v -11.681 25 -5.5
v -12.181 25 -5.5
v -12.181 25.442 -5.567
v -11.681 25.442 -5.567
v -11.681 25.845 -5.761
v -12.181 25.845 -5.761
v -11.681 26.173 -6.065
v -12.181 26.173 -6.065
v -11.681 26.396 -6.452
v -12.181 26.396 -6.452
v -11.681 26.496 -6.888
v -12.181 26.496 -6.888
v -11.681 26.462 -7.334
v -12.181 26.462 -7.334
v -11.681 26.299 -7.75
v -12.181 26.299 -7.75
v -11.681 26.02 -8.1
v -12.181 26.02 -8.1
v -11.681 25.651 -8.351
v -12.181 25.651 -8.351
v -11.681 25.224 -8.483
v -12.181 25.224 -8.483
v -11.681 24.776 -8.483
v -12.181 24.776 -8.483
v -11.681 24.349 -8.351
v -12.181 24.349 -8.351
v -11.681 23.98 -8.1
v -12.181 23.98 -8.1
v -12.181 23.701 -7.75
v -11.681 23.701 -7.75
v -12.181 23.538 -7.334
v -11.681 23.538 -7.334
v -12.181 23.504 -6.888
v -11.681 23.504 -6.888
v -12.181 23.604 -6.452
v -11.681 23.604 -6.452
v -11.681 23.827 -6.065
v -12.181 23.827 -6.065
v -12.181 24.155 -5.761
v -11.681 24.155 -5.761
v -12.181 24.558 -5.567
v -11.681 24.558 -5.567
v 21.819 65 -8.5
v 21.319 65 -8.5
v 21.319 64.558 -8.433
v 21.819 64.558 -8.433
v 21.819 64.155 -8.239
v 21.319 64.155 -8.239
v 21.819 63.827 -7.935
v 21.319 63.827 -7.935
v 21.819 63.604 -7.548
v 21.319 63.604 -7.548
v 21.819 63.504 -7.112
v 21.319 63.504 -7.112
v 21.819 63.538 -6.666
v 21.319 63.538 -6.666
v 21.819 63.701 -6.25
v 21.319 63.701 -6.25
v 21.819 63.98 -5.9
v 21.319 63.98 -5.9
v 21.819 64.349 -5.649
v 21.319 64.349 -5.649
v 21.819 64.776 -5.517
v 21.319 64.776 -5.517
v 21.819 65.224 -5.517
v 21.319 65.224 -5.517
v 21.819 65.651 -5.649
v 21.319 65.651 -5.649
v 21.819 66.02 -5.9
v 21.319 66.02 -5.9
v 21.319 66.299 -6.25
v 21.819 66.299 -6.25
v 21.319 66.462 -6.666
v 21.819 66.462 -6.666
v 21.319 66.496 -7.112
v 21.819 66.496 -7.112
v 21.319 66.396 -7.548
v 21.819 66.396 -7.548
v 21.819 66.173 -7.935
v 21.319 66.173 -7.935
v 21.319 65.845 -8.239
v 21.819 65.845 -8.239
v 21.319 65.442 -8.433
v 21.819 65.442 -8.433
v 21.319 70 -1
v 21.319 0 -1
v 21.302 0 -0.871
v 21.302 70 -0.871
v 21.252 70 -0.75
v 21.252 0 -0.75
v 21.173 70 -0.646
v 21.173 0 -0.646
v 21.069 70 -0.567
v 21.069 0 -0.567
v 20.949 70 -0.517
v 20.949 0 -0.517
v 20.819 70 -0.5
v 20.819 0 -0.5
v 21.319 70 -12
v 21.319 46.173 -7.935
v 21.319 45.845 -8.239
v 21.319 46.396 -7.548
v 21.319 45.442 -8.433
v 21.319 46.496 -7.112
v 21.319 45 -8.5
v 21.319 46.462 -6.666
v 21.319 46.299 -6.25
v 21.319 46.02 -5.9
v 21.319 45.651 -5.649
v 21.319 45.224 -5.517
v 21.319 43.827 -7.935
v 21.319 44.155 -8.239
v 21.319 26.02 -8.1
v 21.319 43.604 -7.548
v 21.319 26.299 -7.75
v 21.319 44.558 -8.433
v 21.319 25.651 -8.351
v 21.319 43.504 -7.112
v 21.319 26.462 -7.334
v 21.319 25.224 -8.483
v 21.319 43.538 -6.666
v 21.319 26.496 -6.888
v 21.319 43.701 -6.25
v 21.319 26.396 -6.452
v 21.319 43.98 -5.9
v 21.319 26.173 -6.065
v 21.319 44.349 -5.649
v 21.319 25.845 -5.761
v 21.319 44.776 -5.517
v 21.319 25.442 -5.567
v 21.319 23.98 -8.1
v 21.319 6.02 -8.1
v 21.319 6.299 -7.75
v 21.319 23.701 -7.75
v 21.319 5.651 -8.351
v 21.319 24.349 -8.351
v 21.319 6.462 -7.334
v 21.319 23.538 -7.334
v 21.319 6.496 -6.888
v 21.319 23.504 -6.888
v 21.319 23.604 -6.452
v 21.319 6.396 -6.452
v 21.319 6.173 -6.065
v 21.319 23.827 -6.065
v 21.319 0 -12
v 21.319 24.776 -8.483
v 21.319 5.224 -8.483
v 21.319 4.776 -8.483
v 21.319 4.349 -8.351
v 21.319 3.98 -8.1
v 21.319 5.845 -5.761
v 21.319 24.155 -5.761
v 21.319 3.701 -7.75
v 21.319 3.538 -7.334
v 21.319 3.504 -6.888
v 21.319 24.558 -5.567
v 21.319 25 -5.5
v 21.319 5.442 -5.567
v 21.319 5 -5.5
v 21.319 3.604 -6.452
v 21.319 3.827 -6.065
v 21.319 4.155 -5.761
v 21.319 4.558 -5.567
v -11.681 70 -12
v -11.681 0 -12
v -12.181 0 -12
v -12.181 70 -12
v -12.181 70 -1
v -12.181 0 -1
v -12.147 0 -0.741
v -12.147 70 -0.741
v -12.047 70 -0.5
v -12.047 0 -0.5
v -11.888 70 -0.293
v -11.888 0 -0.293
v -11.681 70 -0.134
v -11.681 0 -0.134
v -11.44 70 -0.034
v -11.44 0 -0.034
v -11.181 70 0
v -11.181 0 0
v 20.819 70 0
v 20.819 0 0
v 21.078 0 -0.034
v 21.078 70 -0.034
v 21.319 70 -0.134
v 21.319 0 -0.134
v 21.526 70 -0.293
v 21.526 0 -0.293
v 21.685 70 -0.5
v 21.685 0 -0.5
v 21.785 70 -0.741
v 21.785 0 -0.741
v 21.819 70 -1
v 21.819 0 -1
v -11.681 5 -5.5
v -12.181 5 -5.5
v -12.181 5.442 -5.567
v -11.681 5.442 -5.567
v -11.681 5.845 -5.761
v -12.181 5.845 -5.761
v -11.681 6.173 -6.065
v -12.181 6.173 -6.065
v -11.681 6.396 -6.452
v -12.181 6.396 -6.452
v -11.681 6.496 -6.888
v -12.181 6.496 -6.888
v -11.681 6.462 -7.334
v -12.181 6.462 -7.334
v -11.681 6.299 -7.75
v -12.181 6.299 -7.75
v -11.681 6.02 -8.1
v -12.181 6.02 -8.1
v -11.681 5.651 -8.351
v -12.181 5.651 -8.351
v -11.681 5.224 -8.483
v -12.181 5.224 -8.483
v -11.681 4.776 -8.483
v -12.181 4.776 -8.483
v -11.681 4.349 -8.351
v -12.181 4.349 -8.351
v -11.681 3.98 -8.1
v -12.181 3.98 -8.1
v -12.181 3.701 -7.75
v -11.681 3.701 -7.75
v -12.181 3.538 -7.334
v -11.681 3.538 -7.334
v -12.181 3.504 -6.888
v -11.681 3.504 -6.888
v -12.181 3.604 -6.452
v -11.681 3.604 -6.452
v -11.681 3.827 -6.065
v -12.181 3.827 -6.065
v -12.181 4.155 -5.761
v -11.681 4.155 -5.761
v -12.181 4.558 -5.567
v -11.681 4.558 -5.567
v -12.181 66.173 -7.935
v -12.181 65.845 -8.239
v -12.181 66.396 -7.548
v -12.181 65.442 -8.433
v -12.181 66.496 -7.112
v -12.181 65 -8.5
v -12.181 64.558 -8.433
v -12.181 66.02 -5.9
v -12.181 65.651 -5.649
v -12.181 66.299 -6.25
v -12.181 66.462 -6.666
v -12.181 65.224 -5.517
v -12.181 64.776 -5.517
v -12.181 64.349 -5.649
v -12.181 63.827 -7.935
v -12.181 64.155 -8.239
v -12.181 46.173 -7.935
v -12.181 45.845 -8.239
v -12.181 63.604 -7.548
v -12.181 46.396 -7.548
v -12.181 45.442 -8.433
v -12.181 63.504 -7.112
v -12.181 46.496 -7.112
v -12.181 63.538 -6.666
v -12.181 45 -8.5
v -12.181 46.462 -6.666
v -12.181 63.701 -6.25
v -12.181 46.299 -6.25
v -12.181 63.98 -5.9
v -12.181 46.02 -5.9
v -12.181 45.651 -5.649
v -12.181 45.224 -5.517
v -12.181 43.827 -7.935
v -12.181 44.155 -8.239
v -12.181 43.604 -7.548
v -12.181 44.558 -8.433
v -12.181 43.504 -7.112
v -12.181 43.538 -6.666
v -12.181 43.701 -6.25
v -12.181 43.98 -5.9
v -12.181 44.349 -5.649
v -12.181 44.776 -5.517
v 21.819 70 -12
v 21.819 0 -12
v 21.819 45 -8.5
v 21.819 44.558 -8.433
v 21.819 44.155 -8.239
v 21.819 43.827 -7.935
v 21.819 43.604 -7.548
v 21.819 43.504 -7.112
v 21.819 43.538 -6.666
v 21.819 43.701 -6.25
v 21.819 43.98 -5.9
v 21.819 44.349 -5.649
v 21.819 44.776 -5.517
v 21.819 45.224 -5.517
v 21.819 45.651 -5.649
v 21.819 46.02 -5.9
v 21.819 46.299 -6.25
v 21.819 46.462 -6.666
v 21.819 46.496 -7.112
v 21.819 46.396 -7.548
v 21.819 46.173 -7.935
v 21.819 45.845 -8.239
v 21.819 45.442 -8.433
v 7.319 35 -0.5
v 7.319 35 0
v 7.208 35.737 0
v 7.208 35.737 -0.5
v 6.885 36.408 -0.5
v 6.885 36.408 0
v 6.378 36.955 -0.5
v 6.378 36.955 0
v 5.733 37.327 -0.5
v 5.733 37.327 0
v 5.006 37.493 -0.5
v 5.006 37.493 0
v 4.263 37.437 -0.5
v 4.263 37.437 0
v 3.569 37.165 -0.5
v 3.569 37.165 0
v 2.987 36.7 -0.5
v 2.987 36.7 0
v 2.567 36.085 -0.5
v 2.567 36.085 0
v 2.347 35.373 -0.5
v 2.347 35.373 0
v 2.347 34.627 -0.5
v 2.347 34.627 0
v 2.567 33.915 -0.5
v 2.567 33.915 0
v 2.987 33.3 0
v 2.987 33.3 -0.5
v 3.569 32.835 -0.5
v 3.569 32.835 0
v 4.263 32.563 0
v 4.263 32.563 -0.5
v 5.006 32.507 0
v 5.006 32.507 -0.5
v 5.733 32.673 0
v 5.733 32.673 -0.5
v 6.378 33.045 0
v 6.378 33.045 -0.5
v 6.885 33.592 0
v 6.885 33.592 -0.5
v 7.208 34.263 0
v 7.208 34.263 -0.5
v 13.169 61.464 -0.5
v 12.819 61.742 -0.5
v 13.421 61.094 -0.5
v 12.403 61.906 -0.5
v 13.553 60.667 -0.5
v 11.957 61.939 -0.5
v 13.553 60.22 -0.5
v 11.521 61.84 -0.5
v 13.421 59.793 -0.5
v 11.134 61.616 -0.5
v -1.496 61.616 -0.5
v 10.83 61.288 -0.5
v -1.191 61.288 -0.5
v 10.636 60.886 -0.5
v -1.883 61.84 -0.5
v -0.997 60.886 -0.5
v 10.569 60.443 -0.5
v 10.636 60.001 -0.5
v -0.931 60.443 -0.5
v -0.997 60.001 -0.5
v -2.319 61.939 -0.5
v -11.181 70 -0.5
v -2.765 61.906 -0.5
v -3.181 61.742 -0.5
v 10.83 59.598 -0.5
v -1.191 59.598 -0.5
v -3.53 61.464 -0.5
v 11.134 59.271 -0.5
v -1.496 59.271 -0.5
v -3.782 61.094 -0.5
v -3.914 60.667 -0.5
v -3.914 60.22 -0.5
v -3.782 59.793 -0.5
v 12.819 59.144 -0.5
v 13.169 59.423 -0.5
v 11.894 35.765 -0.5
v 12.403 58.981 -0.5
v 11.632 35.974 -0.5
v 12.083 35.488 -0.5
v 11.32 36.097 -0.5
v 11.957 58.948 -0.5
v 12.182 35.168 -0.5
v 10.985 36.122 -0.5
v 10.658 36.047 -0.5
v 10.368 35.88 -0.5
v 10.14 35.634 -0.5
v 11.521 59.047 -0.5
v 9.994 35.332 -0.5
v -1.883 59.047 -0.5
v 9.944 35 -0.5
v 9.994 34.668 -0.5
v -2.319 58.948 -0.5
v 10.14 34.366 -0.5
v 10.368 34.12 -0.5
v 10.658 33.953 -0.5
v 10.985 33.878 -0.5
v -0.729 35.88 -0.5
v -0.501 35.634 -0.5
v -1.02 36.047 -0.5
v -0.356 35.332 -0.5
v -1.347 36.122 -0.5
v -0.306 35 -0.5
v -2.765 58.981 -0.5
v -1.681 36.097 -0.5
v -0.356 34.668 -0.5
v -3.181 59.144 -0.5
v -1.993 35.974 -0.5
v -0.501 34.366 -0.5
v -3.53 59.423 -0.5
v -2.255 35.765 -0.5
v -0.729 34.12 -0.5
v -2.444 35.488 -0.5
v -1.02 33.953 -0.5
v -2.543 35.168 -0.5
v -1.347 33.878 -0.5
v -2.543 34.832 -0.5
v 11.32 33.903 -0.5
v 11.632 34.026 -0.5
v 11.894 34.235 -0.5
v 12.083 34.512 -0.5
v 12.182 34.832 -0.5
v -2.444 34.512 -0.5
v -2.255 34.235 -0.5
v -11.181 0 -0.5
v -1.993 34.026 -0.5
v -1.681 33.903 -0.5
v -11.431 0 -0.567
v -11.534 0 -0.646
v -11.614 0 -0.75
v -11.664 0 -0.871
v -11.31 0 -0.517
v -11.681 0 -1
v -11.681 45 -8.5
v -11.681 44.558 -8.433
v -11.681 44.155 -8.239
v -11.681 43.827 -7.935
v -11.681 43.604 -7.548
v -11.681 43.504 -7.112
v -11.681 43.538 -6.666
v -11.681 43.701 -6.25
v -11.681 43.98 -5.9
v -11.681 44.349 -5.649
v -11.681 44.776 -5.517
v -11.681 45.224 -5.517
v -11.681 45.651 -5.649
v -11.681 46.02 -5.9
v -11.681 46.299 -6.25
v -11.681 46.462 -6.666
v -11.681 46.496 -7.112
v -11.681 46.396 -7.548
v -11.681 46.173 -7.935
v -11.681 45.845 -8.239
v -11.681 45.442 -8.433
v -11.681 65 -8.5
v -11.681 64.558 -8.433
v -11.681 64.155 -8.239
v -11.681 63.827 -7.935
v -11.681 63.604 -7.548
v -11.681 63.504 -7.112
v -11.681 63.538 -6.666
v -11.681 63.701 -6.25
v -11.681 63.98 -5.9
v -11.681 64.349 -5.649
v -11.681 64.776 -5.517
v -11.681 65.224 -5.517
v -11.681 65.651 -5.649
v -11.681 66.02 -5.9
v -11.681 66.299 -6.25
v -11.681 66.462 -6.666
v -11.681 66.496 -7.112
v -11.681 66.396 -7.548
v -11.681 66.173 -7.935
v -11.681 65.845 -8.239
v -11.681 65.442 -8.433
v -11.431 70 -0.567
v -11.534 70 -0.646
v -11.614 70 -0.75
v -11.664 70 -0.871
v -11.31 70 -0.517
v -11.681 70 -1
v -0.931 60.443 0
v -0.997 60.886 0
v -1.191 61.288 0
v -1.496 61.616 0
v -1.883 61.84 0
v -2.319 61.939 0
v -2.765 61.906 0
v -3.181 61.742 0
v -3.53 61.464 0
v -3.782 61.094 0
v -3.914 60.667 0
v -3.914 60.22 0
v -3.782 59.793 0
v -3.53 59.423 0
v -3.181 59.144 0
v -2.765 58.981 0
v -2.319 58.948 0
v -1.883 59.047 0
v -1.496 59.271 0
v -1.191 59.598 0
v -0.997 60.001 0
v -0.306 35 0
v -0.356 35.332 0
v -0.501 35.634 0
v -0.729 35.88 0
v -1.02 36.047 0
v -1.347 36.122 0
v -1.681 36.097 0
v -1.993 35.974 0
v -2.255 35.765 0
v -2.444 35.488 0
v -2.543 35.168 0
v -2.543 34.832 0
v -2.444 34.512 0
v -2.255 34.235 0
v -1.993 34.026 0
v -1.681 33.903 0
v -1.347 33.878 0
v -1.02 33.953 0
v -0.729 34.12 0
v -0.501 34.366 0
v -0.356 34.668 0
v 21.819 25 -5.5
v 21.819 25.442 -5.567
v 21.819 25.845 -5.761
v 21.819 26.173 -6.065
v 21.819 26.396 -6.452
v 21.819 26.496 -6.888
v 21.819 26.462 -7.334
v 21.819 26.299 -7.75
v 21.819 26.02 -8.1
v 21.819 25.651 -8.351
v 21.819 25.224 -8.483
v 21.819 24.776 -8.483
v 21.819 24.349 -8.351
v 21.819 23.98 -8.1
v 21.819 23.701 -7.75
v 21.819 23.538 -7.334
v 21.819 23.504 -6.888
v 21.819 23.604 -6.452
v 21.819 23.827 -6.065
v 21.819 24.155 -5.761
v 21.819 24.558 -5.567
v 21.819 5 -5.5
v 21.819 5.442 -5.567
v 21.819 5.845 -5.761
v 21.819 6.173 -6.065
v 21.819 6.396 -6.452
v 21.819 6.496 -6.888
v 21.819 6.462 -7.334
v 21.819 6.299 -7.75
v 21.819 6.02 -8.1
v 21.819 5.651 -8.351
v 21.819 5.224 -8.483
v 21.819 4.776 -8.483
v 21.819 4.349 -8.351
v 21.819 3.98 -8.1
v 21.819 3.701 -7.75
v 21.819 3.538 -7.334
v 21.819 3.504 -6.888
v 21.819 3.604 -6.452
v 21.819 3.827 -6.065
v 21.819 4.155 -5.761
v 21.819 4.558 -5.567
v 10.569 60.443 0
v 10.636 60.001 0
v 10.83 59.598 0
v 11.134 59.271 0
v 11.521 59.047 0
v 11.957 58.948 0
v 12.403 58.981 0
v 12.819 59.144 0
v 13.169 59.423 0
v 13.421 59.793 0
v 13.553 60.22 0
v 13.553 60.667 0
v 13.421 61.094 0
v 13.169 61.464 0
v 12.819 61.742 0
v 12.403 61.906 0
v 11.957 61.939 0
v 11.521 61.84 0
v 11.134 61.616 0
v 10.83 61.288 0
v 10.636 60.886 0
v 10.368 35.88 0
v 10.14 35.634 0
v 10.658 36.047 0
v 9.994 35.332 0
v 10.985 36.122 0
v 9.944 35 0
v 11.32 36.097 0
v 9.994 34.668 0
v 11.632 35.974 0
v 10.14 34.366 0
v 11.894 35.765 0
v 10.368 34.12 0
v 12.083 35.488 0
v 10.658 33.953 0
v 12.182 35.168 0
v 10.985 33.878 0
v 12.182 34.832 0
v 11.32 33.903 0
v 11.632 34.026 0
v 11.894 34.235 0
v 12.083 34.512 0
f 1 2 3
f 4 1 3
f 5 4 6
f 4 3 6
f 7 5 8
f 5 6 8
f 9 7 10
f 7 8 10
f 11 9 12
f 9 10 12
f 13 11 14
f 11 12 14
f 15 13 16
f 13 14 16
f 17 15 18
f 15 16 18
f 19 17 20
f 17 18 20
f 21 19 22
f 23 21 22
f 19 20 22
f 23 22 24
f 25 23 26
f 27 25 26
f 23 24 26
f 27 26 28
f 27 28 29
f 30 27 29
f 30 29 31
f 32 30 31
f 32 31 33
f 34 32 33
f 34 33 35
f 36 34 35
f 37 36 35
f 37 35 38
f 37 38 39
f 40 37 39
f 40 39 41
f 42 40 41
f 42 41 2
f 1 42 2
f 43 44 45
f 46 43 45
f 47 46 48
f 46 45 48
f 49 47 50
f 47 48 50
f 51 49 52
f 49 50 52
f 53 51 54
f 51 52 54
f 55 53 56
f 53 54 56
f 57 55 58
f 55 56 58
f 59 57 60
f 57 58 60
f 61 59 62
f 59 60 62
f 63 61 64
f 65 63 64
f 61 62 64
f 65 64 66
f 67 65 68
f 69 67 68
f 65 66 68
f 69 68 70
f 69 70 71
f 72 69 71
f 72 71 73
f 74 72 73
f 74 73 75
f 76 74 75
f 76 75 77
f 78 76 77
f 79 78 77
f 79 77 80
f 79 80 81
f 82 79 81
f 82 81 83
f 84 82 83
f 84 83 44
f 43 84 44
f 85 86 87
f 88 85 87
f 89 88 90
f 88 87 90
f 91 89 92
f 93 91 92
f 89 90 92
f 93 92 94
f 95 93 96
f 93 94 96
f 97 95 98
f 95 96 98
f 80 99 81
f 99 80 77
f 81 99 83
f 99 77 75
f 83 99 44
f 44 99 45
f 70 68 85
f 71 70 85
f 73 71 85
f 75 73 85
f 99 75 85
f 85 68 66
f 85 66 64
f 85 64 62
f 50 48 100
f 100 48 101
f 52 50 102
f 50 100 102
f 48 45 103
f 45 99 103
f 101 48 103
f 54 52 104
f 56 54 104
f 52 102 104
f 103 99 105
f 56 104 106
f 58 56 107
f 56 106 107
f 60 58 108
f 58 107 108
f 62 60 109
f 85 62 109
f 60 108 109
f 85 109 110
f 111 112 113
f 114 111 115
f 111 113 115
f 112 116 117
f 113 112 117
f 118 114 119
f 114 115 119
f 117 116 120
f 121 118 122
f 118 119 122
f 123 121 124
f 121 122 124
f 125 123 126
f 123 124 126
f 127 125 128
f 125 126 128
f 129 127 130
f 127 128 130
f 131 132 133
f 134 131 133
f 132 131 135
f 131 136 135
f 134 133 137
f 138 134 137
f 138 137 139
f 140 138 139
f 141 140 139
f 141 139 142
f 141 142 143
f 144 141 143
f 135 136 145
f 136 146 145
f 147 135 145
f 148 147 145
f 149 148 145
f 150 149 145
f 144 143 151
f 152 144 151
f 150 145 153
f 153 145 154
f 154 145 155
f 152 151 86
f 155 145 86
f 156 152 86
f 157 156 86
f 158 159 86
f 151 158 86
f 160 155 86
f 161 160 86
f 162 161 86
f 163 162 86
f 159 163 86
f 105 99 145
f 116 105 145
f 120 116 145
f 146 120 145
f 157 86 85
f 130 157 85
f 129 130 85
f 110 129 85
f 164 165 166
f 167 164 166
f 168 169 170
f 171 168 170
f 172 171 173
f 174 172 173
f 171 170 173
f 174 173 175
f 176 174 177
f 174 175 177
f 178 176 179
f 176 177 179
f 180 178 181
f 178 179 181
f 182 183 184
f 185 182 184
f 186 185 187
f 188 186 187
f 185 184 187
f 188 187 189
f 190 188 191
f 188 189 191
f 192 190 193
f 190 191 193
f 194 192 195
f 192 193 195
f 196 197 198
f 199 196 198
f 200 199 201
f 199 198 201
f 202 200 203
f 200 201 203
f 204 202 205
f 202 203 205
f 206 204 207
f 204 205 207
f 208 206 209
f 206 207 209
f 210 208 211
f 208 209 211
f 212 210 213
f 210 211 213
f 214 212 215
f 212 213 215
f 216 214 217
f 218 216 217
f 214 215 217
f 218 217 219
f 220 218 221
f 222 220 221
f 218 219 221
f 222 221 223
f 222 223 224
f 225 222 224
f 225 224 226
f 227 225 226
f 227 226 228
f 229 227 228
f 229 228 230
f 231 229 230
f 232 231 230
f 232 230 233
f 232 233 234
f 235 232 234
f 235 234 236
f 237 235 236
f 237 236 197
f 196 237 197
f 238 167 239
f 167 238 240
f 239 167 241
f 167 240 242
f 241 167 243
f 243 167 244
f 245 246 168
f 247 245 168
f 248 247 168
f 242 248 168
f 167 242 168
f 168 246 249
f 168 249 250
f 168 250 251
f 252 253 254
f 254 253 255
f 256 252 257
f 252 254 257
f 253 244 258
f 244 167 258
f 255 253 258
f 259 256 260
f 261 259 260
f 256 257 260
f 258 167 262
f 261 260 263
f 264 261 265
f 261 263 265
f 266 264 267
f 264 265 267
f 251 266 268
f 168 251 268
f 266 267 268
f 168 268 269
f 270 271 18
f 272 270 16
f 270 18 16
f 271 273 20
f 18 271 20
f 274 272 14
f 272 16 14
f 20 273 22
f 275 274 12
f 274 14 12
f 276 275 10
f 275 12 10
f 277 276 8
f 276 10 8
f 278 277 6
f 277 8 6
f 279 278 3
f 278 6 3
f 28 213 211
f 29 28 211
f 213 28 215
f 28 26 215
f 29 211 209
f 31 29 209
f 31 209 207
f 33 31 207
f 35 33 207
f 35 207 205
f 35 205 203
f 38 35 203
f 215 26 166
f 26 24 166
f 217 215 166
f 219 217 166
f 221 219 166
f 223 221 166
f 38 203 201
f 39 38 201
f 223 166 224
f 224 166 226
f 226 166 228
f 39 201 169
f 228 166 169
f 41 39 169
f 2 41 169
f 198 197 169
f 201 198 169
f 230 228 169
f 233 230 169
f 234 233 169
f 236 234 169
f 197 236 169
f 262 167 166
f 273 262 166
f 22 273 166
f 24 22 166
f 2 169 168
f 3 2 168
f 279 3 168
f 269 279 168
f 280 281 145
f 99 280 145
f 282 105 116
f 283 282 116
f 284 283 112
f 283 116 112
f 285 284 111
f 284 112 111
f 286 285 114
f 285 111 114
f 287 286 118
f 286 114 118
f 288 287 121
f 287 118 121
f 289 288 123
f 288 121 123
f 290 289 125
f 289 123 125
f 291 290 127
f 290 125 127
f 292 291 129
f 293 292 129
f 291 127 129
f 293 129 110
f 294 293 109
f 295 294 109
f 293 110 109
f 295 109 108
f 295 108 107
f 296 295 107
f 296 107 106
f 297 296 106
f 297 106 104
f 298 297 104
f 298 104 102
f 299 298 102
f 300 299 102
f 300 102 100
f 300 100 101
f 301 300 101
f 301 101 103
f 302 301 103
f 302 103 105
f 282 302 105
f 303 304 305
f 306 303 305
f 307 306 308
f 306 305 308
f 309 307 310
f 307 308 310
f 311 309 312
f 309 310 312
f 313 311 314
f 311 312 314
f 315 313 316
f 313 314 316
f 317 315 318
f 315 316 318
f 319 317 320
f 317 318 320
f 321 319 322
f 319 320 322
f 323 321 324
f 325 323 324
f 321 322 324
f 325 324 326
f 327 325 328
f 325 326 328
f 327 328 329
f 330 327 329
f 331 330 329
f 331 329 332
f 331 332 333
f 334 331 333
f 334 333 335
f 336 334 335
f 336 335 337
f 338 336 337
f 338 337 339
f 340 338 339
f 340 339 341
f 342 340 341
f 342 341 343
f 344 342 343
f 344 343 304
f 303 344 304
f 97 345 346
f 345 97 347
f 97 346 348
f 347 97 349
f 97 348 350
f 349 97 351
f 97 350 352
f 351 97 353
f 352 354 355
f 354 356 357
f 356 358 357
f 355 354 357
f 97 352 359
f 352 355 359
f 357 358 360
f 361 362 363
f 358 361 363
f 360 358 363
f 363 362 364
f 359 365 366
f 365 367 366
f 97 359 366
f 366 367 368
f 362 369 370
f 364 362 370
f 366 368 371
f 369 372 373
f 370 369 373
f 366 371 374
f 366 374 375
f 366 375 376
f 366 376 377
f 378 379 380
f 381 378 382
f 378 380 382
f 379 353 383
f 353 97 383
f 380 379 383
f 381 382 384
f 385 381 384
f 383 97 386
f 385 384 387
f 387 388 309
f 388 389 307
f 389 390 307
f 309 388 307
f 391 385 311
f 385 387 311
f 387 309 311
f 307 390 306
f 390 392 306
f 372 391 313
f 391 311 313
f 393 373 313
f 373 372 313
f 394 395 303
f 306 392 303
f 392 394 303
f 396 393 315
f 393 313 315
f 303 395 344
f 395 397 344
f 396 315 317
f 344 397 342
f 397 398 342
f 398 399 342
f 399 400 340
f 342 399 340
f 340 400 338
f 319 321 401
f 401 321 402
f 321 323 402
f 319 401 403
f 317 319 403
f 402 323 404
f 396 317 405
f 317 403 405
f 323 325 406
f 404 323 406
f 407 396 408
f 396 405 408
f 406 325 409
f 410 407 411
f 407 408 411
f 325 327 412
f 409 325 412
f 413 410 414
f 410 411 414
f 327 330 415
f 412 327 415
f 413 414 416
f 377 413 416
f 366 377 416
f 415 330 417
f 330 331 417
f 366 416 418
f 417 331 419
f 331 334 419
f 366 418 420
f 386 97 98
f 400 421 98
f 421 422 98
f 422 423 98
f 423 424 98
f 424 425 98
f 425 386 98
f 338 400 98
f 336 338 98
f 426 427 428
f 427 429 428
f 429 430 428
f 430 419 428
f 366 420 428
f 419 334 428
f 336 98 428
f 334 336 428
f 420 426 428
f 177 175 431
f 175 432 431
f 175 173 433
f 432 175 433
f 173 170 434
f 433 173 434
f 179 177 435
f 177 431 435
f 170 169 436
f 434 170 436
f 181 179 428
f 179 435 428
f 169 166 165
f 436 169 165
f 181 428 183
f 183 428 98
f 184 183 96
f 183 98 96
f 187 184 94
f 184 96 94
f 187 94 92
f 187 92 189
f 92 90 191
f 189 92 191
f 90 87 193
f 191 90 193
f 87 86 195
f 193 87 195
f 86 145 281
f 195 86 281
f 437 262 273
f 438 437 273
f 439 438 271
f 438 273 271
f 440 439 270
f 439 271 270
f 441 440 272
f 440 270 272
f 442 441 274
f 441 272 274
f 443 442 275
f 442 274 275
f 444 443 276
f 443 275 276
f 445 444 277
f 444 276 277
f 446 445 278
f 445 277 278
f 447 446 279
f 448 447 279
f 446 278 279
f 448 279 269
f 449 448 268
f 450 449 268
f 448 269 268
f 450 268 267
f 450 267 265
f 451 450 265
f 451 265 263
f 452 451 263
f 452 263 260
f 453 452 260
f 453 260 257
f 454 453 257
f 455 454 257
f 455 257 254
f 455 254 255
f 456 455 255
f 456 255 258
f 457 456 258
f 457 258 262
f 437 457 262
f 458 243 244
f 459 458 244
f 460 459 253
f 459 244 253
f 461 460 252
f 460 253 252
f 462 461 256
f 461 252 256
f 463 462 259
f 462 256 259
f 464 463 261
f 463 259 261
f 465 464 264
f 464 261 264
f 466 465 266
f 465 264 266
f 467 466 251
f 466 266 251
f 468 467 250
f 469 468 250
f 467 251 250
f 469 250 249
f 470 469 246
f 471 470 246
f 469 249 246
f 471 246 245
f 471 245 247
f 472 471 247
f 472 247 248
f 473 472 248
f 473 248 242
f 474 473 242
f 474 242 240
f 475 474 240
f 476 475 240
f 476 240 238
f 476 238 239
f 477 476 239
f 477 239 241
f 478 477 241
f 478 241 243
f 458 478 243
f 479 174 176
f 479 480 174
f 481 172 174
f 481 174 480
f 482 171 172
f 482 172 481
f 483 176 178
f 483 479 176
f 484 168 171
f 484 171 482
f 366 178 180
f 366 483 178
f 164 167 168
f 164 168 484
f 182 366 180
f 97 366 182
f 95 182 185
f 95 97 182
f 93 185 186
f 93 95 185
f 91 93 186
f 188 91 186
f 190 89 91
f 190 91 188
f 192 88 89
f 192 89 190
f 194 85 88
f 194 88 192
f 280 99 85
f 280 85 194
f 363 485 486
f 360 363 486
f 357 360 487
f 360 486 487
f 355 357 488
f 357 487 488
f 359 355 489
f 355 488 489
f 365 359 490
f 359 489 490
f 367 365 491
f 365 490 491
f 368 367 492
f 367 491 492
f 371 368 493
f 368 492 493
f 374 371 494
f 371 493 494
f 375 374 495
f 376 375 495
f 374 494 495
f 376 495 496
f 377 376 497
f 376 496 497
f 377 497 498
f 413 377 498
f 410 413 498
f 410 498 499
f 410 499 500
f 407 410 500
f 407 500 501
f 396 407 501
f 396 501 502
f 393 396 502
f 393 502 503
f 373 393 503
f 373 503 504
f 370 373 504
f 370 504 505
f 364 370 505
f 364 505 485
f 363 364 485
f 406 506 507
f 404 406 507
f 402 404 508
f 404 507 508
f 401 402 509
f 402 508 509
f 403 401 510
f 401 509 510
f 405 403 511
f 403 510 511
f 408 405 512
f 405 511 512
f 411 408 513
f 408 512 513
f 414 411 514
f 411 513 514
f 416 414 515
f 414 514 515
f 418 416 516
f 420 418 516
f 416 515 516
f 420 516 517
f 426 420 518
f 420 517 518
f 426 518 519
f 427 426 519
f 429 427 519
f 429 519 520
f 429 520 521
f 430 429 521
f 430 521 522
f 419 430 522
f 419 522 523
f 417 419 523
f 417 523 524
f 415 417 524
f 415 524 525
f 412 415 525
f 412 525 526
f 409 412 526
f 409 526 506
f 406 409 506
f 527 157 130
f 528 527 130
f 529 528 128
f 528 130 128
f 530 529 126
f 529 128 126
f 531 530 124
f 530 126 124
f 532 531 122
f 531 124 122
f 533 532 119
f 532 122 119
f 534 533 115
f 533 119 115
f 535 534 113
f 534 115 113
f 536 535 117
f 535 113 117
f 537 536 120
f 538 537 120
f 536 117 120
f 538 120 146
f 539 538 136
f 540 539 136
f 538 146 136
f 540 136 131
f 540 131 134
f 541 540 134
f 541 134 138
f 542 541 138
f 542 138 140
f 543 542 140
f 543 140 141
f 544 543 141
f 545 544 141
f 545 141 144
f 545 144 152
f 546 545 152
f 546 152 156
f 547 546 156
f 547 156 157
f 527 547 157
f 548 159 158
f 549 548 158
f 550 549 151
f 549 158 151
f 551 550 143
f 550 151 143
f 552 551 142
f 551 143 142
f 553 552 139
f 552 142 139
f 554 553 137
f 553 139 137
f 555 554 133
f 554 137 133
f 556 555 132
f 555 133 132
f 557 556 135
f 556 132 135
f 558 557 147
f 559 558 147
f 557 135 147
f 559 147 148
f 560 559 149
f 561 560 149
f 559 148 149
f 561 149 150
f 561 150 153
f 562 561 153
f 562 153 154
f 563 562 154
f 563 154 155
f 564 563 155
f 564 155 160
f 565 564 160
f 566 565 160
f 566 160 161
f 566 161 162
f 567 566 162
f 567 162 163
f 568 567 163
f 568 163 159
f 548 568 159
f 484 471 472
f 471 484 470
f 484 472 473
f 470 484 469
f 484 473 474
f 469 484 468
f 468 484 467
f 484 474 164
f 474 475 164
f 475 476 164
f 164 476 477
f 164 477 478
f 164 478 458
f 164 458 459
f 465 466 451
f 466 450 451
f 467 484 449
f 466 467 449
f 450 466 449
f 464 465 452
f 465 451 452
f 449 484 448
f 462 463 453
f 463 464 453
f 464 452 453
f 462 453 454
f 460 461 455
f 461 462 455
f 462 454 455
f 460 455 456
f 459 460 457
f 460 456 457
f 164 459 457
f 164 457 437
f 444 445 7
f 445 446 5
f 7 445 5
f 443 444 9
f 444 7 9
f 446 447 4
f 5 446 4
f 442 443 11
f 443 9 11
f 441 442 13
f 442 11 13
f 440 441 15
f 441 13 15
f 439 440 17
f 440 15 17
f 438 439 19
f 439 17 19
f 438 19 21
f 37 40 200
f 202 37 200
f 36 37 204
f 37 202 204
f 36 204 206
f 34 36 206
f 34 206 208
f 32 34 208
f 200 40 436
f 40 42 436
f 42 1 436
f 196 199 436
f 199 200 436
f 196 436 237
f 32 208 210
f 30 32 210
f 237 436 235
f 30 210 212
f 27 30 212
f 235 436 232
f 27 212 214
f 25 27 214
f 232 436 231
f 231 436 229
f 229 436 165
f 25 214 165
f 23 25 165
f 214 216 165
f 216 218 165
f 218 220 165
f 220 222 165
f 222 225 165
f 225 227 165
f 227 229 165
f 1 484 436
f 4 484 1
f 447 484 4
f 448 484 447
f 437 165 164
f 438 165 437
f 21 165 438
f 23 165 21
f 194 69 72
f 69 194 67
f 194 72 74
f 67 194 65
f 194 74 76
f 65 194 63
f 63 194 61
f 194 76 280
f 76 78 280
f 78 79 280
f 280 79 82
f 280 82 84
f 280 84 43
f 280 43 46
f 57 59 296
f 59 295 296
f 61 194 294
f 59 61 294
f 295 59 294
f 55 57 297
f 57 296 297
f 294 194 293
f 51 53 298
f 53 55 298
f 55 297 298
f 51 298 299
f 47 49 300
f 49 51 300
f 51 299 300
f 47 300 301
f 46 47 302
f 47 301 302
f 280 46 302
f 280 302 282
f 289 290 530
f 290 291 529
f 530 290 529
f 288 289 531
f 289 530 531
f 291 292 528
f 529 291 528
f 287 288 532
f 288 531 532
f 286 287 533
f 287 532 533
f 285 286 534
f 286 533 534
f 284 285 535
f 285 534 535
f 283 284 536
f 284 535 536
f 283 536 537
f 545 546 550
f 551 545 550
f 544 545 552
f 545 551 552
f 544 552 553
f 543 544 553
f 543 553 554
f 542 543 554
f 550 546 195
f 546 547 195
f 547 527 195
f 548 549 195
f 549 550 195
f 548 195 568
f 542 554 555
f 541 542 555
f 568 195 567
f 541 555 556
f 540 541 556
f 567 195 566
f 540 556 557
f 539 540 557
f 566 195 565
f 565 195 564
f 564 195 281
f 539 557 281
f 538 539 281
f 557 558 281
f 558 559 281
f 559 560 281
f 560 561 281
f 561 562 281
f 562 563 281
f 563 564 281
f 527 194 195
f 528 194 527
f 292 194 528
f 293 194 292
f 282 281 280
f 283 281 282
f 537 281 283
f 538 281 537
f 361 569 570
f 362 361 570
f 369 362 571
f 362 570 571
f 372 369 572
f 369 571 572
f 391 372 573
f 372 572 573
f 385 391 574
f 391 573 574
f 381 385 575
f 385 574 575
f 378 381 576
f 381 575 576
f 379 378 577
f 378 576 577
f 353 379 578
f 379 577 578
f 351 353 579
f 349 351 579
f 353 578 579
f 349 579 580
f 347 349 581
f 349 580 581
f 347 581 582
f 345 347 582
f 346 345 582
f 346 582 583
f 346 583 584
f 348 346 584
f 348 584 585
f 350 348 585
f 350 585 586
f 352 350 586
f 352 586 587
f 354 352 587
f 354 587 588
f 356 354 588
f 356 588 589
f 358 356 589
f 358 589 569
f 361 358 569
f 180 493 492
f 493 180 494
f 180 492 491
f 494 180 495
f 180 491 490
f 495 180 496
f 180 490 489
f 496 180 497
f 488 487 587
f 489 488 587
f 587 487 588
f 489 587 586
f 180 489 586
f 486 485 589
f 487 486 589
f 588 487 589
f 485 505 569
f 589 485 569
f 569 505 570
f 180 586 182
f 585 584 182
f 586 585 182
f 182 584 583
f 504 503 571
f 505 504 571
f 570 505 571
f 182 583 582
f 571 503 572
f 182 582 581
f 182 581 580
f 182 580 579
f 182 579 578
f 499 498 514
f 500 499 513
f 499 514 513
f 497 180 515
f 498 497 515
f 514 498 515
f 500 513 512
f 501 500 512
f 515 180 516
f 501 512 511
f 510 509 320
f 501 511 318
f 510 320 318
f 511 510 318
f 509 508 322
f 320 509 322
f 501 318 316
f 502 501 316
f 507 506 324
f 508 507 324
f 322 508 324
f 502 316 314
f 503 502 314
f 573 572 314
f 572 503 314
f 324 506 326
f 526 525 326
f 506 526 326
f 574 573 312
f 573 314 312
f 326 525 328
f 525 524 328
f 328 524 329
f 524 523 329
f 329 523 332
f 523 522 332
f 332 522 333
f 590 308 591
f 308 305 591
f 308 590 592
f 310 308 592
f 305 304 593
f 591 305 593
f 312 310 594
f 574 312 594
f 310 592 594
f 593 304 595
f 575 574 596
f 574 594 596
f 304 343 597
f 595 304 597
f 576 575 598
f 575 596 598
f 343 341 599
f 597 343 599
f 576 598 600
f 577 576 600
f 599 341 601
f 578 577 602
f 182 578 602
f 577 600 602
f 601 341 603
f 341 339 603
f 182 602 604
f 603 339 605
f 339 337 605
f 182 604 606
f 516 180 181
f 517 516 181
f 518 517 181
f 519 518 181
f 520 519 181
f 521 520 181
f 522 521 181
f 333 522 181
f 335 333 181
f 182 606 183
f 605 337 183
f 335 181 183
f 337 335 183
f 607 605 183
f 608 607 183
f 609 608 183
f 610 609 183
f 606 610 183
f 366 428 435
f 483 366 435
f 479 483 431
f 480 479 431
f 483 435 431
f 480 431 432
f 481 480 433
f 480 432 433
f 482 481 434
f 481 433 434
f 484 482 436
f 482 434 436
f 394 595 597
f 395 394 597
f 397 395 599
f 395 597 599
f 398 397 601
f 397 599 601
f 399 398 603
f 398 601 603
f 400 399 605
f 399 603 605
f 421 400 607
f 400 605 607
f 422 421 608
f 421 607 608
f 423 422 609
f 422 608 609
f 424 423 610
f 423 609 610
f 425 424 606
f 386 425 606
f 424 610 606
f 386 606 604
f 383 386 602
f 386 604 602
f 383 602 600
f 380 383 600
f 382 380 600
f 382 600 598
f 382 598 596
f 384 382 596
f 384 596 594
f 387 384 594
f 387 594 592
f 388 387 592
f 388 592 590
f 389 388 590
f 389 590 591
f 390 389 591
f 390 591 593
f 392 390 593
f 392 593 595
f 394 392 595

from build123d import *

# Parameters (mm, degrees)
BRIDA_BASE1_DEPTH     = 70
CROQUIS5_R            = 2.5
CROQUIS5_R_2          = 1.125
CROQUIS5_R_3          = 1.5
CORTAR_EXTRUIR1_DEPTH = 10
CROQUIS6_R            = 1.5
CORTAR_EXTRUIR3_DEPTH = 79.74007874


# Sheet-metal steps are written as plain solids
with BuildPart() as part:
    # Croquis1 → Brida base1 (new body)
    with BuildSketch(Plane(origin=(0, 0, 0), x_dir=(1, 0, 0), z_dir=(0, 1, 0))):
        with BuildLine():
            Line((-12.180744501, 12), (-12.180744501, 1))
            ThreePointArc((-12.180744501, 1), (-11.887851282, 0.292893219), (-11.180744501, 0))
            Line((-11.180744501, 0), (20.819255499, 0))
            ThreePointArc((20.819255499, 0), (21.52636228, 0.292893219), (21.819255499, 1))
            Line((21.819255499, 1), (21.819255499, 12))
            Line((21.819255499, 12), (21.319255499, 12))
            Line((21.319255499, 12), (21.319255499, 1))
            ThreePointArc((21.319255499, 1), (21.17280889, 0.646446609), (20.819255499, 0.5))
            Line((20.819255499, 0.5), (-11.180744501, 0.5))
            ThreePointArc((-11.180744501, 0.5), (-11.534297891, 0.646446609), (-11.680744501, 1))
            Line((-11.680744501, 1), (-11.680744501, 12))
            Line((-11.680744501, 12), (-12.180744501, 12))
        make_face()
    extrude(amount=BRIDA_BASE1_DEPTH)

    # Croquis5 → Cortar-Extruir1 (cut)
    with BuildSketch(Plane.XY):
        with Locations((4.819255499, 35)):
            Circle(CROQUIS5_R)
        with Locations((-1.430744501, 35)):
            Circle(CROQUIS5_R_2)
        with Locations(Location((11.069255499, 35, 0), (0, 0, 180))):
            Circle(CROQUIS5_R_2)
        with Locations((-2.430744501, 60.4433725)):
            Circle(CROQUIS5_R_3)
        with Locations(Location((12.069255499, 60.4433725, 0), (0, 0, 180))):
            Circle(CROQUIS5_R_3)
    extrude(amount=-CORTAR_EXTRUIR1_DEPTH, mode=Mode.SUBTRACT)

    # Croquis6 → Cortar-Extruir3 (cut, through all)
    with BuildSketch(Plane.ZY.offset(12.180744501)):
        with Locations(Location((-7, 45, 0), (0, 0, 180))):
            Circle(CROQUIS6_R)
        with Locations((-7, 25)):
            Circle(CROQUIS6_R)
        with Locations((-7, 5)):
            Circle(CROQUIS6_R)
        with Locations(Location((-7, 65, 0), (0, 0, 180))):
            Circle(CROQUIS6_R)
    extrude(amount=-CORTAR_EXTRUIR3_DEPTH, mode=Mode.SUBTRACT)


solid = part.part
